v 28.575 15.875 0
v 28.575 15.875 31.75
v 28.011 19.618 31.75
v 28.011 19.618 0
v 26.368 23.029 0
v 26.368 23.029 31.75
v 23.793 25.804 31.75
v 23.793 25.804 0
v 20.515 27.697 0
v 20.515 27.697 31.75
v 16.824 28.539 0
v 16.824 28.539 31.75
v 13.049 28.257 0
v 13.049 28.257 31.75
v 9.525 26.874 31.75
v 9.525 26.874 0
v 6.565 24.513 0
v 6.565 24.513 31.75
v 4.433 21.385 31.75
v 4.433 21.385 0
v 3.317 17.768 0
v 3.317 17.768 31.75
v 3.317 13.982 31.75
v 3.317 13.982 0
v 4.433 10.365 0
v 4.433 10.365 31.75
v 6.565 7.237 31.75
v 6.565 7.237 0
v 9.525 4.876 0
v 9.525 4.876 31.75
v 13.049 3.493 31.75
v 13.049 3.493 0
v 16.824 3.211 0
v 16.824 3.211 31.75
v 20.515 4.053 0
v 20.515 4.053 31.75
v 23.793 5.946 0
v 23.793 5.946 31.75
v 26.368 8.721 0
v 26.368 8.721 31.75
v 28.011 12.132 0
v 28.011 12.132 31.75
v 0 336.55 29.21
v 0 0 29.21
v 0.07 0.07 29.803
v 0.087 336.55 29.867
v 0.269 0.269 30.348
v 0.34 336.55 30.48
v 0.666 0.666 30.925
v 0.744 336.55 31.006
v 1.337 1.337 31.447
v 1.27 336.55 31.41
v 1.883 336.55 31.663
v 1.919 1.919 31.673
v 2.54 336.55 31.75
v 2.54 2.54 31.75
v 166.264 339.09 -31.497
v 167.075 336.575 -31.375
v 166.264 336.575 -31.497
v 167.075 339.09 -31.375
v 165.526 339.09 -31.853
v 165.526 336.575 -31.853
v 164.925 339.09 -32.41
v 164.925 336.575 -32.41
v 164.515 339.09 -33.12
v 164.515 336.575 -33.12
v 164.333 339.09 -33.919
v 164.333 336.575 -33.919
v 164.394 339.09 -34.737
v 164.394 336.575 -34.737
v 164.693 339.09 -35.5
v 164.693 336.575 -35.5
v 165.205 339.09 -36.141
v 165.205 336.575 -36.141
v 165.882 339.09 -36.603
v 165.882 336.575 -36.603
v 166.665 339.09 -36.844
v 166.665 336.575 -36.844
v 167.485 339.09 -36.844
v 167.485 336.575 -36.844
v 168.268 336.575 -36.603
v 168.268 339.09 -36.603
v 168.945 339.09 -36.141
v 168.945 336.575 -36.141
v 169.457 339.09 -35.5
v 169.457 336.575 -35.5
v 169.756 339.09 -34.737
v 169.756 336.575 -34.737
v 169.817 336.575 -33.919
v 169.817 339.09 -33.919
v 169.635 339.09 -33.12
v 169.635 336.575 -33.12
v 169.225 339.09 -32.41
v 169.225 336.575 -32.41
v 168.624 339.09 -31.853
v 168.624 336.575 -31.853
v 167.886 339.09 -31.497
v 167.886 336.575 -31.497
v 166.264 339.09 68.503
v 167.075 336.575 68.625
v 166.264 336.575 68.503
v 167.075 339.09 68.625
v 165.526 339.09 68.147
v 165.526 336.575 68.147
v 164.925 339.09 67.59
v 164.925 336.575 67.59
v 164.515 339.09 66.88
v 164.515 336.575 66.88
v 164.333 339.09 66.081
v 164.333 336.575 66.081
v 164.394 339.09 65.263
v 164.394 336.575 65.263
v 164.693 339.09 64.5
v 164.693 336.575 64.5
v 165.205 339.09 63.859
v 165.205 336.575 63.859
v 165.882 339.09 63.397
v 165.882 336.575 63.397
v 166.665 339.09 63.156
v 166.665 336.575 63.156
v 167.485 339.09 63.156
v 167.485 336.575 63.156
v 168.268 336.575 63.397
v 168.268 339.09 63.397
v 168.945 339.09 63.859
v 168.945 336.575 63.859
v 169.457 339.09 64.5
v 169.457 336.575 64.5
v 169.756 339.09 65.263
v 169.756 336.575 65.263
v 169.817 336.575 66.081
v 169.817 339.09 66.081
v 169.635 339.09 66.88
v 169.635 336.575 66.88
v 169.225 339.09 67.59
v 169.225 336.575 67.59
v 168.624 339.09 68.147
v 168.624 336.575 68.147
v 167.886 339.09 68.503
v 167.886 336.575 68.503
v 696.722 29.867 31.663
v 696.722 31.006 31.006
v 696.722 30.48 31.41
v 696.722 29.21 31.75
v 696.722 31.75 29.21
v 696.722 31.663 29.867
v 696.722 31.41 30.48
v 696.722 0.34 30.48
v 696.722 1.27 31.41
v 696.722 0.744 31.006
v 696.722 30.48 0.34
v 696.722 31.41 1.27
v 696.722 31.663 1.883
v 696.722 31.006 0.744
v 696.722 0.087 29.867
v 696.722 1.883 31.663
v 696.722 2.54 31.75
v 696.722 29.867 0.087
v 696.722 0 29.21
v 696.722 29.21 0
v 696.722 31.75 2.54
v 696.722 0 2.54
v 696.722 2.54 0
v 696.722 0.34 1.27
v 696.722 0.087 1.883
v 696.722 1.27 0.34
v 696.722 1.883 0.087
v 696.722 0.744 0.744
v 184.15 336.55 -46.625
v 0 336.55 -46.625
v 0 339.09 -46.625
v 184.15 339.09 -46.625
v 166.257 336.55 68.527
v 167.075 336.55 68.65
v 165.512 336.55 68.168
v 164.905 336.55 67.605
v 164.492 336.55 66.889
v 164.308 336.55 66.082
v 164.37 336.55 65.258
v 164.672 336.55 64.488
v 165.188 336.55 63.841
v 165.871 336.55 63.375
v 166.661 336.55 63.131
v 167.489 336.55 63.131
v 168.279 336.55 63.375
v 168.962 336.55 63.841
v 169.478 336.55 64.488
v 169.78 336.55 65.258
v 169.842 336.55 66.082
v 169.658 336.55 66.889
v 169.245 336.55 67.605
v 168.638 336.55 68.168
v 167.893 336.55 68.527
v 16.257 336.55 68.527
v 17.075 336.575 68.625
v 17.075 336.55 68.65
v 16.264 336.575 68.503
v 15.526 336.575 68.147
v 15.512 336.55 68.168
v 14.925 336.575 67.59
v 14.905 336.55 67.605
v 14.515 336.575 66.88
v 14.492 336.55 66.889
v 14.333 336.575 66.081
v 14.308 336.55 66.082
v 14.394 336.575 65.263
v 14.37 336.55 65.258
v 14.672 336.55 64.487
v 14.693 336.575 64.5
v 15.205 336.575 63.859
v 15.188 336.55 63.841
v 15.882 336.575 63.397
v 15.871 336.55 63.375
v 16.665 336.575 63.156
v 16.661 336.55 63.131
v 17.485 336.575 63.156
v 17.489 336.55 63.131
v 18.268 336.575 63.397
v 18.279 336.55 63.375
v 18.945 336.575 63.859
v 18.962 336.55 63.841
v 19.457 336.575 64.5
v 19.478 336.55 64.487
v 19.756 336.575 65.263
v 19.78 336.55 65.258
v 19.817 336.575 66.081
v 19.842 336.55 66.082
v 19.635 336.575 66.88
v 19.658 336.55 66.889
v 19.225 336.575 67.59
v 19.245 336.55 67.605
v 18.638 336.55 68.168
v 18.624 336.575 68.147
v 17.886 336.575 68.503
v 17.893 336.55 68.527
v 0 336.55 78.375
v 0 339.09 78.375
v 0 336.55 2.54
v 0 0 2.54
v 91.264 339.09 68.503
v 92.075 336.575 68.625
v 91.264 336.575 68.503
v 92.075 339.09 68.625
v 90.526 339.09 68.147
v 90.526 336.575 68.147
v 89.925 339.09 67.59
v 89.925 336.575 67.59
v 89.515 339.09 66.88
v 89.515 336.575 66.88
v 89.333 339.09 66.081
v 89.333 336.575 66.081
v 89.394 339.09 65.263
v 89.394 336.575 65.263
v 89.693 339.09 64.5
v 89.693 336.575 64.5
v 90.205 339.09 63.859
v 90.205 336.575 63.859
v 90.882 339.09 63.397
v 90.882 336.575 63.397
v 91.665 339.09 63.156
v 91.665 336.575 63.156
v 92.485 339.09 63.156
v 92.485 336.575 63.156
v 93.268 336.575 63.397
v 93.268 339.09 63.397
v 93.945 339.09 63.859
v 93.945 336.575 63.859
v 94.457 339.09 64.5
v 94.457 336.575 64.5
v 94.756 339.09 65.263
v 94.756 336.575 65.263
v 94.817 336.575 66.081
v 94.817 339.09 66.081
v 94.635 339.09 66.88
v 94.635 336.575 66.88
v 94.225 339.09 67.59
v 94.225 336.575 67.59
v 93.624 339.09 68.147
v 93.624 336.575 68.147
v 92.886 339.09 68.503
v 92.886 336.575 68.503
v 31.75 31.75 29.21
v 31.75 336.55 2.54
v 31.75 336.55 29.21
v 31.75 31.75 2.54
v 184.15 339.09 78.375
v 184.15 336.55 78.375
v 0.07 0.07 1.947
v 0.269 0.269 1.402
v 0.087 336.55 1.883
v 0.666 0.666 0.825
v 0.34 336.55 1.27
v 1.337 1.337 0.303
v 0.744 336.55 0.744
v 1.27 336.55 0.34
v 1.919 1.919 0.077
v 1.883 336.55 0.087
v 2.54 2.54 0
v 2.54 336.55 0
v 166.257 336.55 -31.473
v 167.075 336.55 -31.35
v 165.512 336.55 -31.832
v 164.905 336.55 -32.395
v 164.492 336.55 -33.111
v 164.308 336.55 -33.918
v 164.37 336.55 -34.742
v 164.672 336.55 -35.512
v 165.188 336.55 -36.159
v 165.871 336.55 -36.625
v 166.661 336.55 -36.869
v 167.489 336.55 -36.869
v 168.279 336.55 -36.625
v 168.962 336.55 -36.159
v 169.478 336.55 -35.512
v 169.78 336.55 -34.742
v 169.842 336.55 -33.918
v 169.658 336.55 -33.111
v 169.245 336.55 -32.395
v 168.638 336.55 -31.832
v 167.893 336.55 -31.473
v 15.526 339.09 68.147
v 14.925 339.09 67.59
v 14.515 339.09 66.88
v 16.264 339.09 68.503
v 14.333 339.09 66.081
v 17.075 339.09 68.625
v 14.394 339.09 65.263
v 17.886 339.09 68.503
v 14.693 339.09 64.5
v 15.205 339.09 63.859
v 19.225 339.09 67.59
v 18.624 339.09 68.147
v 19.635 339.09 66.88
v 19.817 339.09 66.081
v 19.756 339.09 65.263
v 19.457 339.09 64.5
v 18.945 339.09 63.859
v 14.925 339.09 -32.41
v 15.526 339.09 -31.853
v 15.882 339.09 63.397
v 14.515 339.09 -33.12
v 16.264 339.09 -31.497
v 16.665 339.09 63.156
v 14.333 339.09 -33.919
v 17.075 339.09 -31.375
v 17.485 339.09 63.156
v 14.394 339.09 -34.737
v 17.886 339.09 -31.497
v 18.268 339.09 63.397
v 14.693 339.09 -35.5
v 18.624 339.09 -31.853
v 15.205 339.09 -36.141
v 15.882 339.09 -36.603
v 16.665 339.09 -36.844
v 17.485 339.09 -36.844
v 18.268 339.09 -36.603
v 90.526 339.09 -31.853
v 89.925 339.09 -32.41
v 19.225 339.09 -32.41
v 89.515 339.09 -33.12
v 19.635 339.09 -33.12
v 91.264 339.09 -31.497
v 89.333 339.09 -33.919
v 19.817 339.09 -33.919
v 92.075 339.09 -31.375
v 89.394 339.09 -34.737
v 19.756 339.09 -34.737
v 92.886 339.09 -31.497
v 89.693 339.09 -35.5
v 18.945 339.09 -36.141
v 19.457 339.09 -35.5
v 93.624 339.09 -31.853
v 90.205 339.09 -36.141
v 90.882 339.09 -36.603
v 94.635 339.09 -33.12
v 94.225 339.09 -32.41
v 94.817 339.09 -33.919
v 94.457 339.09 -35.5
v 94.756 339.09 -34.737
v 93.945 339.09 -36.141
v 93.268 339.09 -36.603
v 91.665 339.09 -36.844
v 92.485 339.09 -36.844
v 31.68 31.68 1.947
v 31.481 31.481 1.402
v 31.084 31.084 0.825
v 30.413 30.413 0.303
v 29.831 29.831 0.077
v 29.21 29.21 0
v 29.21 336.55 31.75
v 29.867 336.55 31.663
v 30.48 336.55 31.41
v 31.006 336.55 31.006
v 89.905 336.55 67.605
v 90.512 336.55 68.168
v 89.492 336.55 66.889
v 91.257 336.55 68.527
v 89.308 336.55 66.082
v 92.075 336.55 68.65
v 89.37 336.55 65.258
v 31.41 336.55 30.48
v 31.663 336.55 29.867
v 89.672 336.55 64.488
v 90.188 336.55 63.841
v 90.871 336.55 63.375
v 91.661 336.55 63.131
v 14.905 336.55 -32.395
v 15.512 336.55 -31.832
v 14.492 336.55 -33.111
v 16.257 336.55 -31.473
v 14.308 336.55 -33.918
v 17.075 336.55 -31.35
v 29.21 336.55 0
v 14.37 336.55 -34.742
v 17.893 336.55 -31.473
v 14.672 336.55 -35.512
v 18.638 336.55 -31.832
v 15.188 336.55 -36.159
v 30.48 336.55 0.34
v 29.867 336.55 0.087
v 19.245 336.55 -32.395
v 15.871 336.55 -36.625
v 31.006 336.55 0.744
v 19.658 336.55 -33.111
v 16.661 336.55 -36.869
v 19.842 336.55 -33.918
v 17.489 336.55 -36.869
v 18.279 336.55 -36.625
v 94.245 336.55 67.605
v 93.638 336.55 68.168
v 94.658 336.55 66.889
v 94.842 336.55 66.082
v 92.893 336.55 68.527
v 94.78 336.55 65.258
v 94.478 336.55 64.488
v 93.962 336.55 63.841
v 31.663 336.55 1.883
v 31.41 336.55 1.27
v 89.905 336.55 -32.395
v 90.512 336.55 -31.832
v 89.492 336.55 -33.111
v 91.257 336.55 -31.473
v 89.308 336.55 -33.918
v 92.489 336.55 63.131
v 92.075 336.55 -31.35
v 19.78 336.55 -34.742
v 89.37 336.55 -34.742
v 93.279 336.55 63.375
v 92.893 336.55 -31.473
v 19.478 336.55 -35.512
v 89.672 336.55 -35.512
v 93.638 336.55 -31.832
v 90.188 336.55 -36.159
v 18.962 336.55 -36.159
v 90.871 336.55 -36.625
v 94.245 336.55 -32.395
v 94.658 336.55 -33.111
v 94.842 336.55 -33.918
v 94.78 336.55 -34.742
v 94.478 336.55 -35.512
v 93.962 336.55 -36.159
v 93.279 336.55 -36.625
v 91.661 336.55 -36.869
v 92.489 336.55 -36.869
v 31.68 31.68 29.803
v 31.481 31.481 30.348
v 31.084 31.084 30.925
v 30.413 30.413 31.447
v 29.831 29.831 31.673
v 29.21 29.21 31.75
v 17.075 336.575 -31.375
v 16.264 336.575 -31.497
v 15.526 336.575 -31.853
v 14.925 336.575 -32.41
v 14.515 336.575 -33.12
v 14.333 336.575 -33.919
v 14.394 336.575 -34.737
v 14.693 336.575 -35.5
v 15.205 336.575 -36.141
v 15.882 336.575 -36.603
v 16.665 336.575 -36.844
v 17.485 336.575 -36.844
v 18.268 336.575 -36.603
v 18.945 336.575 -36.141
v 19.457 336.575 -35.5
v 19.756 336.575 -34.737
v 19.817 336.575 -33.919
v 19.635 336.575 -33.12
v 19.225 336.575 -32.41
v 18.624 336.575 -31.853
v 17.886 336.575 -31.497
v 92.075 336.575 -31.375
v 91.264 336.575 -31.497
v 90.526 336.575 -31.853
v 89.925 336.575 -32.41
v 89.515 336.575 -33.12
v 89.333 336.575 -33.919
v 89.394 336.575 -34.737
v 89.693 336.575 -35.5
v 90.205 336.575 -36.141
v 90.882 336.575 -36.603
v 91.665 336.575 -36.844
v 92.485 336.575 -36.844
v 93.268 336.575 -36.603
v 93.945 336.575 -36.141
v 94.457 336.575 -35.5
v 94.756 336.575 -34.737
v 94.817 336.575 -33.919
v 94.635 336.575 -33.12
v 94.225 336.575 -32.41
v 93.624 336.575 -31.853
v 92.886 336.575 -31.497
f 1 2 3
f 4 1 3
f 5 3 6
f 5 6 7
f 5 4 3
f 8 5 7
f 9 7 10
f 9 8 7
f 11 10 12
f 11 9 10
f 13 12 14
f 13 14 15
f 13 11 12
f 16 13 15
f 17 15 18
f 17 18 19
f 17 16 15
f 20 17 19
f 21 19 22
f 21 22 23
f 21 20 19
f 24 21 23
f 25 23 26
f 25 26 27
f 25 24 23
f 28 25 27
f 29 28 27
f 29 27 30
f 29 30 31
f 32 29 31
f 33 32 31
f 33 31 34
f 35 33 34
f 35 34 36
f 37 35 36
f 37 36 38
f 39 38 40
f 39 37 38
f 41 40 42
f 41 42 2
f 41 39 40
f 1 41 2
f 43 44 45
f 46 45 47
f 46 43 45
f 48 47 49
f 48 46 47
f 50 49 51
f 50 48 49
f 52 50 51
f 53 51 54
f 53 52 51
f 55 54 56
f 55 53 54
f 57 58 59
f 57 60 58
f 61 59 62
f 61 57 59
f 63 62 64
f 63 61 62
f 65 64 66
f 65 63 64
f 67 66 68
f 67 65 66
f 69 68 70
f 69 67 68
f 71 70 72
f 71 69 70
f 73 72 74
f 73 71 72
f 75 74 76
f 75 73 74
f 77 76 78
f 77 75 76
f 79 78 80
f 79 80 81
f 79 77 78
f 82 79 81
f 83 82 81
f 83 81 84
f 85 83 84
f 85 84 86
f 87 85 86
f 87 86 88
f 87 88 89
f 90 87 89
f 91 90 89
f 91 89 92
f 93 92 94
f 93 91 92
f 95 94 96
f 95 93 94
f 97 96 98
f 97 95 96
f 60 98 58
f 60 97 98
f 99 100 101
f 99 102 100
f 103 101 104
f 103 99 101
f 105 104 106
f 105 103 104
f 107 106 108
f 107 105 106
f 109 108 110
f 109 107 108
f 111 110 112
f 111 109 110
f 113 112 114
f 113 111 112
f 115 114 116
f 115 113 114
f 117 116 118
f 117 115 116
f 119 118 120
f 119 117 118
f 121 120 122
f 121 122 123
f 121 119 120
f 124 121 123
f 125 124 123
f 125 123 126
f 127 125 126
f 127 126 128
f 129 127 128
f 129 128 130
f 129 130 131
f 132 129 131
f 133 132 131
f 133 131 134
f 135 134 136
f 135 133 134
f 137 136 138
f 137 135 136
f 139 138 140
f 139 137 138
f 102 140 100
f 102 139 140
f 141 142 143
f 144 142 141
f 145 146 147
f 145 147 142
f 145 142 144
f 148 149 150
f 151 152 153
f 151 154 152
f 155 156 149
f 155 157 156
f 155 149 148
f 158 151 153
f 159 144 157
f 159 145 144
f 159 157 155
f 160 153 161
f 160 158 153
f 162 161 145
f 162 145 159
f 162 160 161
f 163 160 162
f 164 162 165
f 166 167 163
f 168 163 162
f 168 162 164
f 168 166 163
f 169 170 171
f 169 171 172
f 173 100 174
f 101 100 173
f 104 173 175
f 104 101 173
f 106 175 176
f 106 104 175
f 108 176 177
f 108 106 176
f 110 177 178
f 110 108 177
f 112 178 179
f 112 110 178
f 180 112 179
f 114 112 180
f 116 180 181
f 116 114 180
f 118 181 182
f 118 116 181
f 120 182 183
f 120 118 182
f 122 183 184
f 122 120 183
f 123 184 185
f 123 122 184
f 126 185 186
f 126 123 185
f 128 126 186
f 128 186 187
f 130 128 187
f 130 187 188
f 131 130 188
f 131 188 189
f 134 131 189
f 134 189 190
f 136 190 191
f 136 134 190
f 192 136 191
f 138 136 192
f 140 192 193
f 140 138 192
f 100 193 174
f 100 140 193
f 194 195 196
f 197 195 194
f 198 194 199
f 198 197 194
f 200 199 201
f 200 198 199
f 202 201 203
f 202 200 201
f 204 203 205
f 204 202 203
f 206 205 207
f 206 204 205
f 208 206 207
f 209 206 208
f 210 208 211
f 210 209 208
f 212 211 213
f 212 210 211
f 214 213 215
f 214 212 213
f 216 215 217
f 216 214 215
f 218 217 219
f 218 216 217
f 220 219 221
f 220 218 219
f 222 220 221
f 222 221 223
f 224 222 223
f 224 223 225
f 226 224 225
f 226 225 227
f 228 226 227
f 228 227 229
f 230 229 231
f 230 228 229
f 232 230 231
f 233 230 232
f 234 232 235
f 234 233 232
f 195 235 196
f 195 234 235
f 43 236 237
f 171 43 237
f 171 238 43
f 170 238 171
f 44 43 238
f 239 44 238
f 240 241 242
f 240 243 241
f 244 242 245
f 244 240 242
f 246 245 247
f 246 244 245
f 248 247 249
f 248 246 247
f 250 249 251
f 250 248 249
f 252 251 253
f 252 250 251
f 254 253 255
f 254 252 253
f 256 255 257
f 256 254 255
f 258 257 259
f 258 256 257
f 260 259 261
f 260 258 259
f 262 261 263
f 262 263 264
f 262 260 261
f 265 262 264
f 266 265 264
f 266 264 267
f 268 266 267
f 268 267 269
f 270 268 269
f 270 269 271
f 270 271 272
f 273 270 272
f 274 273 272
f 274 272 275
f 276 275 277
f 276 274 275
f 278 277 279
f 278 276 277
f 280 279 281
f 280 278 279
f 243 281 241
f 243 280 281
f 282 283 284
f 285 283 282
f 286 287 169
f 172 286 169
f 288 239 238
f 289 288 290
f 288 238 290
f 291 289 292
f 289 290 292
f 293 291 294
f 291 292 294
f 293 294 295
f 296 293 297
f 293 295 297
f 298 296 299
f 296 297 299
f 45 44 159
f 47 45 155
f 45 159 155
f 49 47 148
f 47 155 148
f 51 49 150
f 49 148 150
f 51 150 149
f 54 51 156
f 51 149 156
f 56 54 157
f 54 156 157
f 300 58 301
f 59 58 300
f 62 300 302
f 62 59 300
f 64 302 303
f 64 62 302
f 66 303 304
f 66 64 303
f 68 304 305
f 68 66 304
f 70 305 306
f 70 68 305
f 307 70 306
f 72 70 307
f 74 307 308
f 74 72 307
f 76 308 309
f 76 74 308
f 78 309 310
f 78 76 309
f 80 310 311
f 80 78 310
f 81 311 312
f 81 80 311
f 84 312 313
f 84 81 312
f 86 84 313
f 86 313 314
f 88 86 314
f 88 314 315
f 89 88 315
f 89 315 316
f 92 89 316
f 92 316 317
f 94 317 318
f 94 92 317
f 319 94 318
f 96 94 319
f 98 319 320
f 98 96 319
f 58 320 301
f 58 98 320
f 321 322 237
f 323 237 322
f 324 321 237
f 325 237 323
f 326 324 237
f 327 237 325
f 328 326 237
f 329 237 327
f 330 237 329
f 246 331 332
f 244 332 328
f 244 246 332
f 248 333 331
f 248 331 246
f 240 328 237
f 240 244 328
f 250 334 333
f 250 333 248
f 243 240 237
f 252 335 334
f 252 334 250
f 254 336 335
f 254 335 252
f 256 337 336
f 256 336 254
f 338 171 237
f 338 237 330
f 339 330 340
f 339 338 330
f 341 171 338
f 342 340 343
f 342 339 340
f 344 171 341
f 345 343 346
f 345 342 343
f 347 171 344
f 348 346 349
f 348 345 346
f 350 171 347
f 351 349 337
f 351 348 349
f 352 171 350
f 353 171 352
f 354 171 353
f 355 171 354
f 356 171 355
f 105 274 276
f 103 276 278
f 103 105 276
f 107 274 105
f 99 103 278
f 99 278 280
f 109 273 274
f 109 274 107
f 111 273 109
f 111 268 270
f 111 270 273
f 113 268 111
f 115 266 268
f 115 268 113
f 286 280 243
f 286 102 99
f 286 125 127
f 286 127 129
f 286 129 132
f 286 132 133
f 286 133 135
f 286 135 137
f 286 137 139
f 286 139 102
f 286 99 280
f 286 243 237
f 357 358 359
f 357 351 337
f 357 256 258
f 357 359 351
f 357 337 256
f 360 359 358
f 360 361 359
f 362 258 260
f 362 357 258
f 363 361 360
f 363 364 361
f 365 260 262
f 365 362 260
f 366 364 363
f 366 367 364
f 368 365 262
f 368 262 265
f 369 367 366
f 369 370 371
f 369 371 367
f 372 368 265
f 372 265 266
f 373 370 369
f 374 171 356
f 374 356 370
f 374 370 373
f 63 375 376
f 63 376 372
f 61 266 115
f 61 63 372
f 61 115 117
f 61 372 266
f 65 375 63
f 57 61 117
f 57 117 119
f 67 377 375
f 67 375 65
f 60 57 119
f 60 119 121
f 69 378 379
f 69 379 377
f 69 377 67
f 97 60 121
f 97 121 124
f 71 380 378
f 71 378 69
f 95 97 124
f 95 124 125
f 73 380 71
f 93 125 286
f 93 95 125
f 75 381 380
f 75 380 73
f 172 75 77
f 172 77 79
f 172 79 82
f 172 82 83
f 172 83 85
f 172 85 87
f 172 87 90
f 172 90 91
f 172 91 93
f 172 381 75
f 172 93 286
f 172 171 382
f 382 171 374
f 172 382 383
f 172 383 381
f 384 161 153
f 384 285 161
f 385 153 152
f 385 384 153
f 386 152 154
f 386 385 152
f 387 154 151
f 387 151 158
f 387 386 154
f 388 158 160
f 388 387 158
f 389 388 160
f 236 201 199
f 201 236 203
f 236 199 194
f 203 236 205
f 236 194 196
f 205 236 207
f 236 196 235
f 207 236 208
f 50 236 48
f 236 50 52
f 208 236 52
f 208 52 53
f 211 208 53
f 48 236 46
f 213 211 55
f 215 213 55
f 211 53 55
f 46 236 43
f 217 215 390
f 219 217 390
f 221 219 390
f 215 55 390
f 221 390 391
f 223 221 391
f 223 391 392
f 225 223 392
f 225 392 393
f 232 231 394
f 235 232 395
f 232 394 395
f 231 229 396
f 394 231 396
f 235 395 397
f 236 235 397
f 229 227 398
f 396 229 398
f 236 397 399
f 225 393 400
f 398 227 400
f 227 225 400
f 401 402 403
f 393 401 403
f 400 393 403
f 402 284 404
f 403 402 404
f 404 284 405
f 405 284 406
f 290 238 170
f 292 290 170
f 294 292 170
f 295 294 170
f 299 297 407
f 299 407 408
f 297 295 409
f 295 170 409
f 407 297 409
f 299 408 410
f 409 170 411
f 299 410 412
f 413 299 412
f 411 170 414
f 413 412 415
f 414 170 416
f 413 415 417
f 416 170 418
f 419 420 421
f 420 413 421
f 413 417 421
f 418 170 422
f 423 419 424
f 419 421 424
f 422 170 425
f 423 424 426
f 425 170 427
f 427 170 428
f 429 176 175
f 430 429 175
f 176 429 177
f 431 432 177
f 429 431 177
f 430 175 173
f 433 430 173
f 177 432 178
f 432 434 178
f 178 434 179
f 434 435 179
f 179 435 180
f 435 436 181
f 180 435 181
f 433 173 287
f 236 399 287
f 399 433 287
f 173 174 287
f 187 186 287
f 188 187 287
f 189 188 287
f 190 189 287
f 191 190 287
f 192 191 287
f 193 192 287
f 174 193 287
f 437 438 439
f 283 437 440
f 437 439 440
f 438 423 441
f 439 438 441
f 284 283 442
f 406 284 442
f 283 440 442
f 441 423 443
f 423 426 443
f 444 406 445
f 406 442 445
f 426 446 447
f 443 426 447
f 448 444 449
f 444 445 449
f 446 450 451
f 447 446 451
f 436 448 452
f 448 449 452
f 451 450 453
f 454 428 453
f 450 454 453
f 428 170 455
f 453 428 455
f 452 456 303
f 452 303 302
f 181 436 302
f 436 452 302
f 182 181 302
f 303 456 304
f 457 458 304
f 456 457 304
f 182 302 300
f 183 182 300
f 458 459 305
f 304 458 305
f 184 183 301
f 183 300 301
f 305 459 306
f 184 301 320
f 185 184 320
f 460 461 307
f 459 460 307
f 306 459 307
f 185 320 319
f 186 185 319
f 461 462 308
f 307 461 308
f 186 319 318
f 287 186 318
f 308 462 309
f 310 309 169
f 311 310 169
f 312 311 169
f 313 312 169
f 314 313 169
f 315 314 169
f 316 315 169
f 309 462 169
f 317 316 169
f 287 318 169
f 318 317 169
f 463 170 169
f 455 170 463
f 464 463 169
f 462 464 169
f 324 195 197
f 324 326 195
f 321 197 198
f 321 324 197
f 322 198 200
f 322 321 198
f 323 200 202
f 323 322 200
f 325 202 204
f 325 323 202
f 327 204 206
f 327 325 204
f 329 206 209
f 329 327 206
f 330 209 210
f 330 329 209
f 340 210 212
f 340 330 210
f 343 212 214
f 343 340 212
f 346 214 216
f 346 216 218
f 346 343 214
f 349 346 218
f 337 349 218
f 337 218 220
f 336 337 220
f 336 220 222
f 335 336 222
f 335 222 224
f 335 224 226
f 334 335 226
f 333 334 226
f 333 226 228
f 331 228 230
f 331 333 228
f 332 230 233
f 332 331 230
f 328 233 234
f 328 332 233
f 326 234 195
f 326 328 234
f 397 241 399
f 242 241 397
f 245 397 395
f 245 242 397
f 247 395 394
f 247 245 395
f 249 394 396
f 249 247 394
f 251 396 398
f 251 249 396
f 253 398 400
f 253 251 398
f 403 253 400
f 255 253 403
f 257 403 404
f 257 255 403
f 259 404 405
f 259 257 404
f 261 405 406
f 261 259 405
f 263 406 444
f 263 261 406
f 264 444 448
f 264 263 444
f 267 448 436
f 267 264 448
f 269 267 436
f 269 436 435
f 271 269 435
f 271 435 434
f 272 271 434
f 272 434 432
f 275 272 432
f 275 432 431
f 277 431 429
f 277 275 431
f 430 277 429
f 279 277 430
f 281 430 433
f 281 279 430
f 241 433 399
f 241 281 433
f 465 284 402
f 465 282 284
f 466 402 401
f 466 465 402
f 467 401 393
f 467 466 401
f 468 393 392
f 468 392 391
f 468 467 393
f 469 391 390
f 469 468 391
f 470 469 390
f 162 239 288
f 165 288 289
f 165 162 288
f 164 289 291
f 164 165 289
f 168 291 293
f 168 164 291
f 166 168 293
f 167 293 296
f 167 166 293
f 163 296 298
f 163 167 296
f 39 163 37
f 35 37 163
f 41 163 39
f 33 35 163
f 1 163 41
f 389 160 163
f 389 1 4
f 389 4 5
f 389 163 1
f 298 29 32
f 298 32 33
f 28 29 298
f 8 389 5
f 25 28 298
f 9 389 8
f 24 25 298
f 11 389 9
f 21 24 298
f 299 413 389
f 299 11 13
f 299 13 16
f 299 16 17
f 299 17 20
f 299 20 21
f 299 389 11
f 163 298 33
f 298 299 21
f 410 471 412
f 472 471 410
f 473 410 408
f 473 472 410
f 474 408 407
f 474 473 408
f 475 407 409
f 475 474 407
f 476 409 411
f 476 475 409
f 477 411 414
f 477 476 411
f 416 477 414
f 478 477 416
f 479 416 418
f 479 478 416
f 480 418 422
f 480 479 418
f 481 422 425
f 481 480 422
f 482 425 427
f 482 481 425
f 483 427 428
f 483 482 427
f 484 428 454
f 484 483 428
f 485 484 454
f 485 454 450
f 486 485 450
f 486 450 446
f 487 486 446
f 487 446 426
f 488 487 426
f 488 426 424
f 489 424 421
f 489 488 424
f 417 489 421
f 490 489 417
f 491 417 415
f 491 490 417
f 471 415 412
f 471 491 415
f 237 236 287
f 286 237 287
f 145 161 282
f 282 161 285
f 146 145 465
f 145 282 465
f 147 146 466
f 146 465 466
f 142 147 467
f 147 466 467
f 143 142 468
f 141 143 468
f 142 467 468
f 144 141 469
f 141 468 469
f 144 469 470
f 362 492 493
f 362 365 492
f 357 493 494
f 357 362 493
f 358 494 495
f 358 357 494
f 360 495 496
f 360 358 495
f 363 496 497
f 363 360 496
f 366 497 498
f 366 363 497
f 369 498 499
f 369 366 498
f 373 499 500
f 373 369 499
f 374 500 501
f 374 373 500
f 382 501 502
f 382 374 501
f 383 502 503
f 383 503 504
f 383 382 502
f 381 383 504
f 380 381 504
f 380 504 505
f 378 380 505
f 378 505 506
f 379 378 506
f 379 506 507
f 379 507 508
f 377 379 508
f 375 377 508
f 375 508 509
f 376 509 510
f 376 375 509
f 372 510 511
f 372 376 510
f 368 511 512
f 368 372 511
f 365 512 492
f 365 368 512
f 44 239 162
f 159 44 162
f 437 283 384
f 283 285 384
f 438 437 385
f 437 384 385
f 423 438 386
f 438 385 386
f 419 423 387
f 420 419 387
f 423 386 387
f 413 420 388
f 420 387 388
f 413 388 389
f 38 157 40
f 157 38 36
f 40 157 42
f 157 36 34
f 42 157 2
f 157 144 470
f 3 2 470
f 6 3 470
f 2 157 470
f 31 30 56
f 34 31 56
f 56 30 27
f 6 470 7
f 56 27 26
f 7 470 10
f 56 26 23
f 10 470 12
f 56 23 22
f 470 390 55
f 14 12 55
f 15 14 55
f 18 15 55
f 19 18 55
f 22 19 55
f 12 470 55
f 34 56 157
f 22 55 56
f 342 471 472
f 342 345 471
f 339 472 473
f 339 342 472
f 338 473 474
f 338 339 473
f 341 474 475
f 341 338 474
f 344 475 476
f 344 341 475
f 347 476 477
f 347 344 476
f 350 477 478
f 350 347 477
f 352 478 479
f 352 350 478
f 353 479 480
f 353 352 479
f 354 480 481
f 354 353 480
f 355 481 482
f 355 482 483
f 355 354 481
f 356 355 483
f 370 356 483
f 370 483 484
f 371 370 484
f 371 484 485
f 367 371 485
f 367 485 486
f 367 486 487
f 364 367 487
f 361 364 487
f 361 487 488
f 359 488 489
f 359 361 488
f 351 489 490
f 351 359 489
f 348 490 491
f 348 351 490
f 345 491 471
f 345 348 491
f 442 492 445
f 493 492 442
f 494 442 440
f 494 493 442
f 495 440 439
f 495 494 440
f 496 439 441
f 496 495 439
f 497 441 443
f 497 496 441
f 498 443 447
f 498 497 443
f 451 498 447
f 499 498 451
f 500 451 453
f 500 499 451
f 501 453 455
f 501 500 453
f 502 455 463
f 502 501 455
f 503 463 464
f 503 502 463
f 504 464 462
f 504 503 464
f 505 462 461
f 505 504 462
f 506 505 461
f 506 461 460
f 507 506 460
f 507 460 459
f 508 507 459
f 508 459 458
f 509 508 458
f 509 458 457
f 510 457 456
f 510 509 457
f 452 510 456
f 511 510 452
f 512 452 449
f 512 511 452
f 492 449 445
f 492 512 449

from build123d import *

# Parameters (mm, degrees)
SKETCH1_R                     = 12.7
BOSS_EXTRUDE1_DEPTH           = 31.75
FILLET1_R                     = 2.54
SKETCH3_W                     = 184.15
SKETCH3_H                     = 125
BOSS_EXTRUDE2_DEPTH           = 2.54
M5_CLEARANCE_HOLE1_AT_2_COUNT = 2
M5_CLEARANCE_HOLE1_AT_2_PITCH = 180.277563773
M5_CLEARANCE_HOLE1_AT_3_COUNT = 2
M5_CLEARANCE_HOLE1_AT_3_PITCH = 150
M5_CLEARANCE_HOLE1_AT_4_COUNT = 2
M5_CLEARANCE_HOLE1_AT_4_PITCH = 100
M5_CLEARANCE_HOLE1_AT_5_COUNT = 2
M5_CLEARANCE_HOLE1_AT_5_PITCH = 75
M5_CLEARANCE_HOLE1_AT_6_COUNT = 2
M5_CLEARANCE_HOLE1_AT_6_PITCH = 125


with BuildPart() as part:
    # Sketch1 → Boss-Extrude1 (new body)
    with BuildSketch(Plane.XY):
        Polygon((31.75, 31.75), (645.922, 31.75), (696.722, 31.75), (696.722, 0), (645.922, 0), (0, 0), (0, 336.55), (31.75, 336.55), align=None)
        with Locations((15.875, 15.875)):
            Circle(SKETCH1_R, mode=Mode.SUBTRACT)
    extrude(amount=BOSS_EXTRUDE1_DEPTH)

    # Fillet1
    fillet1_edges = [part.edges().sort_by_distance(p)[0] for p in [
        (348.361, 0, 31.75),
        (0, 168.275, 0),
        (364.236, 31.75, 31.75),
        (31.75, 184.15, 31.75),
        (0, 168.275, 31.75),
        (31.75, 184.15, 0),
        (364.236, 31.75, 0),
        (348.361, 0, 0),
    ]]
    fillet(fillet1_edges, radius=FILLET1_R)

    # Sketch3 → Boss-Extrude2 (add)
    with BuildSketch(Plane(origin=(0, 336.55, 0), x_dir=(1, 0, 0), z_dir=(0, 1, 0))):
        with Locations((92.075, -15.875)):
            Rectangle(SKETCH3_W, SKETCH3_H)
    extrude(amount=BOSS_EXTRUDE2_DEPTH)

    # Sketch8 → M5 Clearance Hole1 (revolve, cut)
    with BuildSketch(Plane(origin=(167.075, 339.09, -34.125), x_dir=(0, 0, 1), z_dir=(1, 0, 0))):
        Polygon((0, 0), (0, 2.54), (2.775, 2.54), (2.75, 2.515), (2.75, 0), align=None)
    m5_clearance_hole1 = revolve(axis=Axis((167.075, 345.44, -34.125), (0, -1, 0)), mode=Mode.SUBTRACT)

    # M5 Clearance Hole1 at 2: M5 Clearance Hole1 ×2
    with Locations(*[Vector(-0.8320502943378437, 0, 0.5547001962252293) * (i * M5_CLEARANCE_HOLE1_AT_2_PITCH) for i in range(1, M5_CLEARANCE_HOLE1_AT_2_COUNT)]):
        add(m5_clearance_hole1, mode=Mode.SUBTRACT)

    # M5 Clearance Hole1 at 3: M5 Clearance Hole1 ×2
    with Locations(*[(-i * M5_CLEARANCE_HOLE1_AT_3_PITCH, 0, 0) for i in range(1, M5_CLEARANCE_HOLE1_AT_3_COUNT)]):
        add(m5_clearance_hole1, mode=Mode.SUBTRACT)

    # M5 Clearance Hole1 at 4: M5 Clearance Hole1 ×2
    with Locations(*[(0, 0, i * M5_CLEARANCE_HOLE1_AT_4_PITCH) for i in range(1, M5_CLEARANCE_HOLE1_AT_4_COUNT)]):
        add(m5_clearance_hole1, mode=Mode.SUBTRACT)

    # M5 Clearance Hole1 at 5: M5 Clearance Hole1 ×2
    with Locations(*[(-i * M5_CLEARANCE_HOLE1_AT_5_PITCH, 0, 0) for i in range(1, M5_CLEARANCE_HOLE1_AT_5_COUNT)]):
        add(m5_clearance_hole1, mode=Mode.SUBTRACT)

    # M5 Clearance Hole1 at 6: M5 Clearance Hole1 ×2
    with Locations(*[Vector(-0.6, 0, 0.8) * (i * M5_CLEARANCE_HOLE1_AT_6_PITCH) for i in range(1, M5_CLEARANCE_HOLE1_AT_6_COUNT)]):
        add(m5_clearance_hole1, mode=Mode.SUBTRACT)


solid = part.part
